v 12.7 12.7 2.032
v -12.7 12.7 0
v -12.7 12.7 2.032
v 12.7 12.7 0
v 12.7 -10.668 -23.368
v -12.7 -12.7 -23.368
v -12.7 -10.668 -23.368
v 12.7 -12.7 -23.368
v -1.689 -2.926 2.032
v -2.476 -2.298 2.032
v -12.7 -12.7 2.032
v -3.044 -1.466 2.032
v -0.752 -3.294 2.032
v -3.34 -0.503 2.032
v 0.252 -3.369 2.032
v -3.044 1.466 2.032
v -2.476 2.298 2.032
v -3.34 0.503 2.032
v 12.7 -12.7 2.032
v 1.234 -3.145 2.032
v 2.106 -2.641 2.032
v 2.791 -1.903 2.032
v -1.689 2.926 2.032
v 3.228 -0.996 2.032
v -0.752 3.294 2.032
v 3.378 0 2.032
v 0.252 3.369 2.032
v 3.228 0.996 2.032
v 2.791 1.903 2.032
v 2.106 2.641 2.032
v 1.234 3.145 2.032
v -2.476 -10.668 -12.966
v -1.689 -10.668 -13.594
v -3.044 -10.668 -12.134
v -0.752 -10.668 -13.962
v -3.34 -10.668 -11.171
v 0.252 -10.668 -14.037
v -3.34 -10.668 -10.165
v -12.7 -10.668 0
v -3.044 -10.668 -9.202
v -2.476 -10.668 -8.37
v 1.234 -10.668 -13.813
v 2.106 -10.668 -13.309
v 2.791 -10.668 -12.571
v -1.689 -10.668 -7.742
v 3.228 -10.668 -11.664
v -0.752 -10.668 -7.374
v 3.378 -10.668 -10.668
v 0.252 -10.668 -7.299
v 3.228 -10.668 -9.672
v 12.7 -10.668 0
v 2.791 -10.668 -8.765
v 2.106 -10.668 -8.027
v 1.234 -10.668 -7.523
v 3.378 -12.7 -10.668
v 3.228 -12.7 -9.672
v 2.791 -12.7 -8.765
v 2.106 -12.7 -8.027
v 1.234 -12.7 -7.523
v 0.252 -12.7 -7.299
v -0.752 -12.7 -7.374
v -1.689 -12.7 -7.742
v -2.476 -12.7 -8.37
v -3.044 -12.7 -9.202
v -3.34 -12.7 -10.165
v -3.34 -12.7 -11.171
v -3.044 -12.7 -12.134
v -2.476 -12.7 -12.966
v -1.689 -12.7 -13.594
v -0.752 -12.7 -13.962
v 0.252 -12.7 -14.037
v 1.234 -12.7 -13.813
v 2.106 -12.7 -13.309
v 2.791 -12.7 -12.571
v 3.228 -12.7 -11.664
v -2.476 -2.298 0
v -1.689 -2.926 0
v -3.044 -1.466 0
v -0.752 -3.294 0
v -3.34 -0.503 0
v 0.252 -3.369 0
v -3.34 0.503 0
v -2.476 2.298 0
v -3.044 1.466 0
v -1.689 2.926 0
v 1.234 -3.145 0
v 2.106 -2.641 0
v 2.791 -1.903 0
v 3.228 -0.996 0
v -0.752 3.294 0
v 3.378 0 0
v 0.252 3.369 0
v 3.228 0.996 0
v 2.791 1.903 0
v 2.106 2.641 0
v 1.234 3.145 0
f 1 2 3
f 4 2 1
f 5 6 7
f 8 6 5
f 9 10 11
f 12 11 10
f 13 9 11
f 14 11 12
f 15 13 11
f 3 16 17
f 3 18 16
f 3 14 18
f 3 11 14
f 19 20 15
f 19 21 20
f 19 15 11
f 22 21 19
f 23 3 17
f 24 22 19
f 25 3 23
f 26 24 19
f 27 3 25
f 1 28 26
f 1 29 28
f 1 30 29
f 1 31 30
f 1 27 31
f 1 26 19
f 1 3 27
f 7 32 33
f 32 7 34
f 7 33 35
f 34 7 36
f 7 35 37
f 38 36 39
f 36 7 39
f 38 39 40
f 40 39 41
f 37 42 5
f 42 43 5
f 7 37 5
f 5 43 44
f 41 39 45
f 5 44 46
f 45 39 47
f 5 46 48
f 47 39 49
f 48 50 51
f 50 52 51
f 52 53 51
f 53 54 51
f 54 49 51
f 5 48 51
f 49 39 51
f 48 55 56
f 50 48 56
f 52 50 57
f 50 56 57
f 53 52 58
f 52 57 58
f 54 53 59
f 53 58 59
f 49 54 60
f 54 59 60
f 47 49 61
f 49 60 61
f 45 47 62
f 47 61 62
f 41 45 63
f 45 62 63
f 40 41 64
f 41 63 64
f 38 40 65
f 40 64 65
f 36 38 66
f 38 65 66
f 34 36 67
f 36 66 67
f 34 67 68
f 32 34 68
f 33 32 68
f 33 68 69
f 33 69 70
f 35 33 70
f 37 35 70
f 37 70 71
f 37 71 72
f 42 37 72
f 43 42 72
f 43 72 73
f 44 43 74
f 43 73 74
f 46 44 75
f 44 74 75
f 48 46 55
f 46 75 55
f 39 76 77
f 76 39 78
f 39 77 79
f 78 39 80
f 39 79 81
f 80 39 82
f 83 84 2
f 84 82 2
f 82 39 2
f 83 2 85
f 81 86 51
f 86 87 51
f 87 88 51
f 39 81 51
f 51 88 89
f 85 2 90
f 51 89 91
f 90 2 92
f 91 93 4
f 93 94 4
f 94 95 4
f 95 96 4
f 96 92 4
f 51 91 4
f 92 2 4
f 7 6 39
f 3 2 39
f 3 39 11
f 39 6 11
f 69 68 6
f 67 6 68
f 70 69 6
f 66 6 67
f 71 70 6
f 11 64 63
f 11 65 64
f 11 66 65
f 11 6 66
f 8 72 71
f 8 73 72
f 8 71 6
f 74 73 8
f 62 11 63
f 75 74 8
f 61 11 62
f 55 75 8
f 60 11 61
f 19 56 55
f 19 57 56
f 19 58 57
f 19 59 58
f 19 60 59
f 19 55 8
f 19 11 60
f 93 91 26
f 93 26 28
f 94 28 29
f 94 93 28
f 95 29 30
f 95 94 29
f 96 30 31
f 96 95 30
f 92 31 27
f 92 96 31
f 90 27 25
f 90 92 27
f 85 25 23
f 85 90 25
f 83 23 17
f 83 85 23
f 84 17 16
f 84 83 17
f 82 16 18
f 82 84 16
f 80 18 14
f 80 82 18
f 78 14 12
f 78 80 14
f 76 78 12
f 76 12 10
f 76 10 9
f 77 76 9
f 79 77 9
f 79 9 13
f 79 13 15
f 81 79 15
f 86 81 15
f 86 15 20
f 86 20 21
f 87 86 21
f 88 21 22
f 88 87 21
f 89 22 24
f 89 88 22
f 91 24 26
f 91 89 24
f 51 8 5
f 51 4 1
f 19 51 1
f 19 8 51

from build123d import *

# Parameters (mm, degrees)
SKETCH_W     = 25.4
SKETCH_H     = 25.4
SKETCH_R     = 3.3782
PAD_DEPTH    = 2.032
SKETCH001_W  = 25.4
SKETCH001_H  = 25.4
SKETCH001_R  = 3.3782
PAD001_DEPTH = 2.032


with BuildPart() as part:
    # Sketch → Pad (new body)
    with BuildSketch(Plane.XY):
        Rectangle(SKETCH_W, SKETCH_H)
        Circle(SKETCH_R, mode=Mode.SUBTRACT)
    extrude(amount=PAD_DEPTH)

    # Sketch001 (on Face2 of Pad) → Pad001 (join)
    with BuildSketch(Plane.XZ.offset(12.7)):
        with Locations((0, -10.668)):
            Rectangle(SKETCH001_W, SKETCH001_H)
        with Locations((0, -10.668)):
            Circle(SKETCH001_R, mode=Mode.SUBTRACT)
    extrude(amount=-PAD001_DEPTH)


solid = part.part
